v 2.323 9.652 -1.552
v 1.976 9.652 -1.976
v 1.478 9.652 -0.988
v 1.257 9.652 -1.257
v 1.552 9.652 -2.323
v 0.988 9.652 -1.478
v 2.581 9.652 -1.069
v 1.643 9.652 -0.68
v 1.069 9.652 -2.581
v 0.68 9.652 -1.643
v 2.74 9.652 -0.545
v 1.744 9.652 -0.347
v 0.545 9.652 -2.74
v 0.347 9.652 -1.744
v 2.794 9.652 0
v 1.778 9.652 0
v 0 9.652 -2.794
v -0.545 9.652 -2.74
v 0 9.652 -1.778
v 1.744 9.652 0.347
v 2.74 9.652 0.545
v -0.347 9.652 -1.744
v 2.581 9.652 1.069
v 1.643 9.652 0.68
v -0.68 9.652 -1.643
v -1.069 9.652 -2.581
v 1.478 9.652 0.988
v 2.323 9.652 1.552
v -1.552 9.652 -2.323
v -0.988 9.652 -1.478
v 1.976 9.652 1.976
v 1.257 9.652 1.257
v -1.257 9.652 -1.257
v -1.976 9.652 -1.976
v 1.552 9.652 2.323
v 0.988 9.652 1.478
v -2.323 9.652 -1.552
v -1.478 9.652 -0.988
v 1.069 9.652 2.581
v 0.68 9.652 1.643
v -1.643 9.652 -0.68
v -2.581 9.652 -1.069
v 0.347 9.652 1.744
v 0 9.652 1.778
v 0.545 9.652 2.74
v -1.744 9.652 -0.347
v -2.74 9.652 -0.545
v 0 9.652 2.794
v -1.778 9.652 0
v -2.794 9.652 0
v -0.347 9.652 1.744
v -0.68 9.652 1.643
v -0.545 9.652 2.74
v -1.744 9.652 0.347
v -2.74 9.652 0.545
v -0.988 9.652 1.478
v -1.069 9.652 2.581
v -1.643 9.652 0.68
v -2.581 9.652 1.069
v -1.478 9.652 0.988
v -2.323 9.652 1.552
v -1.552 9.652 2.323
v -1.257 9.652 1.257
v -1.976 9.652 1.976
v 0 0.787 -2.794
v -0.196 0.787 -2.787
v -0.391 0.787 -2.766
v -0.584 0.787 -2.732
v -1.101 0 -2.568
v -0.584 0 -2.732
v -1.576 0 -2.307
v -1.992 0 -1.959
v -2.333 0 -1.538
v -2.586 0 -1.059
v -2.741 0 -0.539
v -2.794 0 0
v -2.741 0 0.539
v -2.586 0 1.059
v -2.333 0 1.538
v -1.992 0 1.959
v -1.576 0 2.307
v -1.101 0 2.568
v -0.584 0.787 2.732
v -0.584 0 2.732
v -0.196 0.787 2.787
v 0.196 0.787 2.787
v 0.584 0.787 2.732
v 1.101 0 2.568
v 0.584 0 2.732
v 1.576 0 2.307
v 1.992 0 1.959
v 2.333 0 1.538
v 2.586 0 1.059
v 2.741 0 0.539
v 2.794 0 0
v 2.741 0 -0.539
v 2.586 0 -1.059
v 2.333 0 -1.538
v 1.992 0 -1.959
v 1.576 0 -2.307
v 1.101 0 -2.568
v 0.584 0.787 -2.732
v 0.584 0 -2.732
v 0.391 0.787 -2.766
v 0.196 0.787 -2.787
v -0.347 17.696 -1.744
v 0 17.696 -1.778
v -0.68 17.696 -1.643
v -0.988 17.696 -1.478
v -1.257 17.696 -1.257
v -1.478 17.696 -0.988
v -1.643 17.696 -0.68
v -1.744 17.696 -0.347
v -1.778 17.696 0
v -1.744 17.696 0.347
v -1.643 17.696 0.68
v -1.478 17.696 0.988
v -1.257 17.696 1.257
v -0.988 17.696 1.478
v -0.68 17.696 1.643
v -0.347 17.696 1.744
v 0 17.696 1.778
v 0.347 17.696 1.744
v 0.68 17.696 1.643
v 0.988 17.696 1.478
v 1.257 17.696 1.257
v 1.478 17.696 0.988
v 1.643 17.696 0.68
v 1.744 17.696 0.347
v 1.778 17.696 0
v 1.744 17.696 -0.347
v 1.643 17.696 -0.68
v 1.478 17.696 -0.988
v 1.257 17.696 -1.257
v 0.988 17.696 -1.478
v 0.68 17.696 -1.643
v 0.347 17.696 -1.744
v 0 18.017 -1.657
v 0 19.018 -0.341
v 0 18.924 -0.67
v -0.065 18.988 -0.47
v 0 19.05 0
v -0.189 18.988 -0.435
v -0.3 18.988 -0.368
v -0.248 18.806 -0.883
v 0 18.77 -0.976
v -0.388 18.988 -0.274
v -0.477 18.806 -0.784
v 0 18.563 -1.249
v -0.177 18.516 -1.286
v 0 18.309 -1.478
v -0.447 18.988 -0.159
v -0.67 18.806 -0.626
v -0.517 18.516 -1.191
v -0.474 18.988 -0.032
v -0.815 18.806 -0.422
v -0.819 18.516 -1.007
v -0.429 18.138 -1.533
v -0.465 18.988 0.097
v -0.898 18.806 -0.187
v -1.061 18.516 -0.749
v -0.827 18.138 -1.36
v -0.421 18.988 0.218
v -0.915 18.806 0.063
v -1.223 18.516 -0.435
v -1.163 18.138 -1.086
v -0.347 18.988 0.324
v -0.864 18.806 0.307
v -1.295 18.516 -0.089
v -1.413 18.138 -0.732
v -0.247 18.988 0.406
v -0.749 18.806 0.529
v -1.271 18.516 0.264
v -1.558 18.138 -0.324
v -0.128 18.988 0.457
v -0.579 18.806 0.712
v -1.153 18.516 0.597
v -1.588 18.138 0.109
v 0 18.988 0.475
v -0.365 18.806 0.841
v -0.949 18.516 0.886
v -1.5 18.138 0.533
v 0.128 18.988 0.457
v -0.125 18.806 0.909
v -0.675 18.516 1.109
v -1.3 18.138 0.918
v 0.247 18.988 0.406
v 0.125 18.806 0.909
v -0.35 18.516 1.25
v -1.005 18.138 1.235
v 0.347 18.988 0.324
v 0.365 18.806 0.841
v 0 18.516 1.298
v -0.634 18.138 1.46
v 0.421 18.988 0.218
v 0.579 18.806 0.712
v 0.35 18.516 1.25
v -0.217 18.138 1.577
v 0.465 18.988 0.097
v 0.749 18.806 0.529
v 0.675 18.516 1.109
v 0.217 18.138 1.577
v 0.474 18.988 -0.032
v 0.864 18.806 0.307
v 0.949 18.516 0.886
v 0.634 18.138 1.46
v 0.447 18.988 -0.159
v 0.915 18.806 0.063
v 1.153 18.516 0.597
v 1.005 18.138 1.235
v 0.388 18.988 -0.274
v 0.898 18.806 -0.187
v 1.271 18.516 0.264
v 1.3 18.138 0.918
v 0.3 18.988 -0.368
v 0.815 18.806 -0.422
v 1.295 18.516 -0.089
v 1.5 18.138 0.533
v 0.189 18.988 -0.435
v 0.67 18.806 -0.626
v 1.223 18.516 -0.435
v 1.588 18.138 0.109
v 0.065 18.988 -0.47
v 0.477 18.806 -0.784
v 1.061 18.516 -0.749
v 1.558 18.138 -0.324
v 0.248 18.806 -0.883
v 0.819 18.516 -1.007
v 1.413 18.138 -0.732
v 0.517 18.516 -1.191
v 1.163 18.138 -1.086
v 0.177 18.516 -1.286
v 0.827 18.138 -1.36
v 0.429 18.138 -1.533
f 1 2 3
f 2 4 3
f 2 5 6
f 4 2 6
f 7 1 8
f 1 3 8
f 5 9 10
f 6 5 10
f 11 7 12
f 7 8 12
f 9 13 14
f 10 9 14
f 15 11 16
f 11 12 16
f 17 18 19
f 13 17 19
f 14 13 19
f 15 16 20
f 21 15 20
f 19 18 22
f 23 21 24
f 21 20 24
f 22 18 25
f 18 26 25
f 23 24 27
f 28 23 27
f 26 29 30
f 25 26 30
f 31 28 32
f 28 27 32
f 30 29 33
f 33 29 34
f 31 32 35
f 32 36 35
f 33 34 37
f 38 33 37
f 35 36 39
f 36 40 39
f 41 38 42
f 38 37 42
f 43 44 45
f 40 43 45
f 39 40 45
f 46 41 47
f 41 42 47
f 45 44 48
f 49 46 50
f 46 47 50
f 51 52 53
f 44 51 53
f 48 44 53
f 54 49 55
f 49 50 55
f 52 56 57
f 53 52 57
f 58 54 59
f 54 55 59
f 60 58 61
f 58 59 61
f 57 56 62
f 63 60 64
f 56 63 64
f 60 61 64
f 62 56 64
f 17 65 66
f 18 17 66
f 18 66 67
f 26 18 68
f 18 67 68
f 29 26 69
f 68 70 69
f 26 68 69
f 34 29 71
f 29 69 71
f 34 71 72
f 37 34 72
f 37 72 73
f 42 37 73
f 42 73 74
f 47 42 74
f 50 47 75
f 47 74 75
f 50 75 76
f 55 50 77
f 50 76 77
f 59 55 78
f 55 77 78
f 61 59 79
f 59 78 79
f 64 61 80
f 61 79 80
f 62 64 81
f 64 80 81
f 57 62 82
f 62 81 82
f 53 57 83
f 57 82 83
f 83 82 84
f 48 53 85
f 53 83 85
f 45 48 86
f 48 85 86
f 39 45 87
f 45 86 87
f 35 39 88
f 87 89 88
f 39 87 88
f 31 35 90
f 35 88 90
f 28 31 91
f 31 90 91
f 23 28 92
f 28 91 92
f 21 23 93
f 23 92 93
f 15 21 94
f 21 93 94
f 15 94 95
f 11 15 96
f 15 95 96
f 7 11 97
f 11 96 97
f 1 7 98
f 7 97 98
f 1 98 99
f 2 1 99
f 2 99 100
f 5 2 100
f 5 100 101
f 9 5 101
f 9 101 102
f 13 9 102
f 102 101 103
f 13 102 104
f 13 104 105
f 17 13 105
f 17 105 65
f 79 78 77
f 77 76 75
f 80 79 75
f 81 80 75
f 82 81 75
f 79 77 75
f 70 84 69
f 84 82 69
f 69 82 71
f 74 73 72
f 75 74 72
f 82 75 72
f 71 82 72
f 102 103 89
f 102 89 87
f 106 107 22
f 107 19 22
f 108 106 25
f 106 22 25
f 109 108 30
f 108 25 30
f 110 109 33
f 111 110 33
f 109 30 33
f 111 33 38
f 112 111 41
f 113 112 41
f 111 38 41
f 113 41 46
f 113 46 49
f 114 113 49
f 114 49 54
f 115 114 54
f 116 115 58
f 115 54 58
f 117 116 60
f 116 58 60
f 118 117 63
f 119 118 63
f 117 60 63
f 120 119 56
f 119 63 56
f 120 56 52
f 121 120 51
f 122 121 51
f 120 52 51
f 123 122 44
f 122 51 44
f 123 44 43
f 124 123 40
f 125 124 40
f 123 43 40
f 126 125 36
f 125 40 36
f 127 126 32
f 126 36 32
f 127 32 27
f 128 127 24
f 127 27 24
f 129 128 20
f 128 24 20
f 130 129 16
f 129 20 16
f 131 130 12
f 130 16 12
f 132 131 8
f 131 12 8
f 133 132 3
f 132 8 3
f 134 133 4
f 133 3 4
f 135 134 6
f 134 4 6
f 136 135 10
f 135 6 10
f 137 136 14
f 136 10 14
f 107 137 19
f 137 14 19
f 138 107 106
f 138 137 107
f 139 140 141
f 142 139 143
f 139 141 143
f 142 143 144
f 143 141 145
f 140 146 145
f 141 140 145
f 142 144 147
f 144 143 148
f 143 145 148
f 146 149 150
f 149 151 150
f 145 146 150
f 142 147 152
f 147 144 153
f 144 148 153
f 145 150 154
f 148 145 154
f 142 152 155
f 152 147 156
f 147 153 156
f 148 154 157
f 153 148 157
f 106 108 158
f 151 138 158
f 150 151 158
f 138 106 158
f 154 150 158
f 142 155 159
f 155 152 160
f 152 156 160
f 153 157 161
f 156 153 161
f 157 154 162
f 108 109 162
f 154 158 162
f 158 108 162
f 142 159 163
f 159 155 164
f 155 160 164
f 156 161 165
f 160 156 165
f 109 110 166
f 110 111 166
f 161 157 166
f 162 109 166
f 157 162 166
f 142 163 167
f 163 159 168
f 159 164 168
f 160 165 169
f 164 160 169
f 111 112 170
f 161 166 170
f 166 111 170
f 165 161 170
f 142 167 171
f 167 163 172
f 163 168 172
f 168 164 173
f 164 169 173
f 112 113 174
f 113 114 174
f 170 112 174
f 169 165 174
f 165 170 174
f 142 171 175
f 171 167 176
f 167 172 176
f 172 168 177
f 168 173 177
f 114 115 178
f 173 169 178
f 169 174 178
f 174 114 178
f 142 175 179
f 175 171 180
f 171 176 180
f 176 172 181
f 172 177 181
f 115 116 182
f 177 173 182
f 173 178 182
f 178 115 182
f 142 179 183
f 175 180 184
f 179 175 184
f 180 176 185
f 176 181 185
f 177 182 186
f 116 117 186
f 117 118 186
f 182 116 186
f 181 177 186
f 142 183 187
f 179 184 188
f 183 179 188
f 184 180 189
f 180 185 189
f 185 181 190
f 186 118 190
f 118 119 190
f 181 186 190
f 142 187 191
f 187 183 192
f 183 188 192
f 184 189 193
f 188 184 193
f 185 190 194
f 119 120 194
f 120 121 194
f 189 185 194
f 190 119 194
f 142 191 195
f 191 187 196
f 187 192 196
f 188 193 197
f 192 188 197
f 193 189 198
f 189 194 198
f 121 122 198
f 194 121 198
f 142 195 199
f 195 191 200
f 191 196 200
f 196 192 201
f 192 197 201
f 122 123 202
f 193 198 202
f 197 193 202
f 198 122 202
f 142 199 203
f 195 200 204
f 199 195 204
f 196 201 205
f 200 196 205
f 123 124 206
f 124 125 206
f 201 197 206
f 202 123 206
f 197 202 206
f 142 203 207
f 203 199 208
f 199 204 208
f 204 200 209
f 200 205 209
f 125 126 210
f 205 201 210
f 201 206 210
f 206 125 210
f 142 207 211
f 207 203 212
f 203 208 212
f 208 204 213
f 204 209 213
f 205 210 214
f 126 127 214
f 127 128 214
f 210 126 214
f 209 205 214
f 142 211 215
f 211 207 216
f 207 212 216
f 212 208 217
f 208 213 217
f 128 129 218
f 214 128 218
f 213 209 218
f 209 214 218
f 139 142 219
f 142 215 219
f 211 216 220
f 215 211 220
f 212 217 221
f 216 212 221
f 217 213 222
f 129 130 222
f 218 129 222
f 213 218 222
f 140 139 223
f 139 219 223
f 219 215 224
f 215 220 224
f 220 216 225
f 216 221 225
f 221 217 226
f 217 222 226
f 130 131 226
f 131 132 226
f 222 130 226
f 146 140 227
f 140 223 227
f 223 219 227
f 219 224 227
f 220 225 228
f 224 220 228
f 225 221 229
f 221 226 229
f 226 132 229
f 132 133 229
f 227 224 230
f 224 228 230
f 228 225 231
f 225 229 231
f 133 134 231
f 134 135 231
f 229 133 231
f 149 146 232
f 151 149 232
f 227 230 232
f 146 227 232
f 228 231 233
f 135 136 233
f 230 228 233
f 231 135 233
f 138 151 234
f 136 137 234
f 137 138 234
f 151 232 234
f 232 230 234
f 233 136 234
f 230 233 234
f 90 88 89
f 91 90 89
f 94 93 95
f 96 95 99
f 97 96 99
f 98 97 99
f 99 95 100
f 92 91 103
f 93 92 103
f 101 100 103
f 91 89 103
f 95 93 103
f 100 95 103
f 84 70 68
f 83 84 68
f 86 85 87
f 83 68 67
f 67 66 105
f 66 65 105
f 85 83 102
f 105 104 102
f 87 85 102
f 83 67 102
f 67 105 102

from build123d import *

# Parameters (mm, degrees)
CUT_EXTRUDE1_DEPTH      = 20.455471518
CUT_EXTRUDE1_DEPTH_BACK = 20.455471518
SKETCH2_W               = 1.1684
SKETCH2_H               = 0.7874


with BuildPart() as part:
    # Sketch1 → Revolve1 (revolve)
    with BuildSketch(Plane.XY, mode=Mode.PRIVATE) as revolve1_sk:
        with BuildLine():
            Line((0, 0), (0, 19.05))
            ThreePointArc((0, 19.05), (1.117279291, 18.67312328), (1.778, 17.696497855))
            Line((1.778, 17.696497855), (1.778, 9.652))
            Line((1.778, 9.652), (2.794, 9.652))
            Line((2.794, 9.652), (2.794, 0))
            Line((2.794, 0), (0, 0))
        make_face()
    revolve(revolve1_sk.sketch.rotate(Axis((0, 0, 0), (0, 1, 0)), 90), axis=Axis((0, 0, 0), (0, 1, 0)))

    # Sketch2 → Cut-Extrude1 (cut, two sides: drawn at the far end of the back side and taken through both)
    with BuildSketch(Plane.XY.offset(-CUT_EXTRUDE1_DEPTH_BACK)):
        with Locations((0, 0.3937)):
            Rectangle(SKETCH2_W, SKETCH2_H)
    extrude(amount=CUT_EXTRUDE1_DEPTH + CUT_EXTRUDE1_DEPTH_BACK, mode=Mode.SUBTRACT)


solid = part.part
